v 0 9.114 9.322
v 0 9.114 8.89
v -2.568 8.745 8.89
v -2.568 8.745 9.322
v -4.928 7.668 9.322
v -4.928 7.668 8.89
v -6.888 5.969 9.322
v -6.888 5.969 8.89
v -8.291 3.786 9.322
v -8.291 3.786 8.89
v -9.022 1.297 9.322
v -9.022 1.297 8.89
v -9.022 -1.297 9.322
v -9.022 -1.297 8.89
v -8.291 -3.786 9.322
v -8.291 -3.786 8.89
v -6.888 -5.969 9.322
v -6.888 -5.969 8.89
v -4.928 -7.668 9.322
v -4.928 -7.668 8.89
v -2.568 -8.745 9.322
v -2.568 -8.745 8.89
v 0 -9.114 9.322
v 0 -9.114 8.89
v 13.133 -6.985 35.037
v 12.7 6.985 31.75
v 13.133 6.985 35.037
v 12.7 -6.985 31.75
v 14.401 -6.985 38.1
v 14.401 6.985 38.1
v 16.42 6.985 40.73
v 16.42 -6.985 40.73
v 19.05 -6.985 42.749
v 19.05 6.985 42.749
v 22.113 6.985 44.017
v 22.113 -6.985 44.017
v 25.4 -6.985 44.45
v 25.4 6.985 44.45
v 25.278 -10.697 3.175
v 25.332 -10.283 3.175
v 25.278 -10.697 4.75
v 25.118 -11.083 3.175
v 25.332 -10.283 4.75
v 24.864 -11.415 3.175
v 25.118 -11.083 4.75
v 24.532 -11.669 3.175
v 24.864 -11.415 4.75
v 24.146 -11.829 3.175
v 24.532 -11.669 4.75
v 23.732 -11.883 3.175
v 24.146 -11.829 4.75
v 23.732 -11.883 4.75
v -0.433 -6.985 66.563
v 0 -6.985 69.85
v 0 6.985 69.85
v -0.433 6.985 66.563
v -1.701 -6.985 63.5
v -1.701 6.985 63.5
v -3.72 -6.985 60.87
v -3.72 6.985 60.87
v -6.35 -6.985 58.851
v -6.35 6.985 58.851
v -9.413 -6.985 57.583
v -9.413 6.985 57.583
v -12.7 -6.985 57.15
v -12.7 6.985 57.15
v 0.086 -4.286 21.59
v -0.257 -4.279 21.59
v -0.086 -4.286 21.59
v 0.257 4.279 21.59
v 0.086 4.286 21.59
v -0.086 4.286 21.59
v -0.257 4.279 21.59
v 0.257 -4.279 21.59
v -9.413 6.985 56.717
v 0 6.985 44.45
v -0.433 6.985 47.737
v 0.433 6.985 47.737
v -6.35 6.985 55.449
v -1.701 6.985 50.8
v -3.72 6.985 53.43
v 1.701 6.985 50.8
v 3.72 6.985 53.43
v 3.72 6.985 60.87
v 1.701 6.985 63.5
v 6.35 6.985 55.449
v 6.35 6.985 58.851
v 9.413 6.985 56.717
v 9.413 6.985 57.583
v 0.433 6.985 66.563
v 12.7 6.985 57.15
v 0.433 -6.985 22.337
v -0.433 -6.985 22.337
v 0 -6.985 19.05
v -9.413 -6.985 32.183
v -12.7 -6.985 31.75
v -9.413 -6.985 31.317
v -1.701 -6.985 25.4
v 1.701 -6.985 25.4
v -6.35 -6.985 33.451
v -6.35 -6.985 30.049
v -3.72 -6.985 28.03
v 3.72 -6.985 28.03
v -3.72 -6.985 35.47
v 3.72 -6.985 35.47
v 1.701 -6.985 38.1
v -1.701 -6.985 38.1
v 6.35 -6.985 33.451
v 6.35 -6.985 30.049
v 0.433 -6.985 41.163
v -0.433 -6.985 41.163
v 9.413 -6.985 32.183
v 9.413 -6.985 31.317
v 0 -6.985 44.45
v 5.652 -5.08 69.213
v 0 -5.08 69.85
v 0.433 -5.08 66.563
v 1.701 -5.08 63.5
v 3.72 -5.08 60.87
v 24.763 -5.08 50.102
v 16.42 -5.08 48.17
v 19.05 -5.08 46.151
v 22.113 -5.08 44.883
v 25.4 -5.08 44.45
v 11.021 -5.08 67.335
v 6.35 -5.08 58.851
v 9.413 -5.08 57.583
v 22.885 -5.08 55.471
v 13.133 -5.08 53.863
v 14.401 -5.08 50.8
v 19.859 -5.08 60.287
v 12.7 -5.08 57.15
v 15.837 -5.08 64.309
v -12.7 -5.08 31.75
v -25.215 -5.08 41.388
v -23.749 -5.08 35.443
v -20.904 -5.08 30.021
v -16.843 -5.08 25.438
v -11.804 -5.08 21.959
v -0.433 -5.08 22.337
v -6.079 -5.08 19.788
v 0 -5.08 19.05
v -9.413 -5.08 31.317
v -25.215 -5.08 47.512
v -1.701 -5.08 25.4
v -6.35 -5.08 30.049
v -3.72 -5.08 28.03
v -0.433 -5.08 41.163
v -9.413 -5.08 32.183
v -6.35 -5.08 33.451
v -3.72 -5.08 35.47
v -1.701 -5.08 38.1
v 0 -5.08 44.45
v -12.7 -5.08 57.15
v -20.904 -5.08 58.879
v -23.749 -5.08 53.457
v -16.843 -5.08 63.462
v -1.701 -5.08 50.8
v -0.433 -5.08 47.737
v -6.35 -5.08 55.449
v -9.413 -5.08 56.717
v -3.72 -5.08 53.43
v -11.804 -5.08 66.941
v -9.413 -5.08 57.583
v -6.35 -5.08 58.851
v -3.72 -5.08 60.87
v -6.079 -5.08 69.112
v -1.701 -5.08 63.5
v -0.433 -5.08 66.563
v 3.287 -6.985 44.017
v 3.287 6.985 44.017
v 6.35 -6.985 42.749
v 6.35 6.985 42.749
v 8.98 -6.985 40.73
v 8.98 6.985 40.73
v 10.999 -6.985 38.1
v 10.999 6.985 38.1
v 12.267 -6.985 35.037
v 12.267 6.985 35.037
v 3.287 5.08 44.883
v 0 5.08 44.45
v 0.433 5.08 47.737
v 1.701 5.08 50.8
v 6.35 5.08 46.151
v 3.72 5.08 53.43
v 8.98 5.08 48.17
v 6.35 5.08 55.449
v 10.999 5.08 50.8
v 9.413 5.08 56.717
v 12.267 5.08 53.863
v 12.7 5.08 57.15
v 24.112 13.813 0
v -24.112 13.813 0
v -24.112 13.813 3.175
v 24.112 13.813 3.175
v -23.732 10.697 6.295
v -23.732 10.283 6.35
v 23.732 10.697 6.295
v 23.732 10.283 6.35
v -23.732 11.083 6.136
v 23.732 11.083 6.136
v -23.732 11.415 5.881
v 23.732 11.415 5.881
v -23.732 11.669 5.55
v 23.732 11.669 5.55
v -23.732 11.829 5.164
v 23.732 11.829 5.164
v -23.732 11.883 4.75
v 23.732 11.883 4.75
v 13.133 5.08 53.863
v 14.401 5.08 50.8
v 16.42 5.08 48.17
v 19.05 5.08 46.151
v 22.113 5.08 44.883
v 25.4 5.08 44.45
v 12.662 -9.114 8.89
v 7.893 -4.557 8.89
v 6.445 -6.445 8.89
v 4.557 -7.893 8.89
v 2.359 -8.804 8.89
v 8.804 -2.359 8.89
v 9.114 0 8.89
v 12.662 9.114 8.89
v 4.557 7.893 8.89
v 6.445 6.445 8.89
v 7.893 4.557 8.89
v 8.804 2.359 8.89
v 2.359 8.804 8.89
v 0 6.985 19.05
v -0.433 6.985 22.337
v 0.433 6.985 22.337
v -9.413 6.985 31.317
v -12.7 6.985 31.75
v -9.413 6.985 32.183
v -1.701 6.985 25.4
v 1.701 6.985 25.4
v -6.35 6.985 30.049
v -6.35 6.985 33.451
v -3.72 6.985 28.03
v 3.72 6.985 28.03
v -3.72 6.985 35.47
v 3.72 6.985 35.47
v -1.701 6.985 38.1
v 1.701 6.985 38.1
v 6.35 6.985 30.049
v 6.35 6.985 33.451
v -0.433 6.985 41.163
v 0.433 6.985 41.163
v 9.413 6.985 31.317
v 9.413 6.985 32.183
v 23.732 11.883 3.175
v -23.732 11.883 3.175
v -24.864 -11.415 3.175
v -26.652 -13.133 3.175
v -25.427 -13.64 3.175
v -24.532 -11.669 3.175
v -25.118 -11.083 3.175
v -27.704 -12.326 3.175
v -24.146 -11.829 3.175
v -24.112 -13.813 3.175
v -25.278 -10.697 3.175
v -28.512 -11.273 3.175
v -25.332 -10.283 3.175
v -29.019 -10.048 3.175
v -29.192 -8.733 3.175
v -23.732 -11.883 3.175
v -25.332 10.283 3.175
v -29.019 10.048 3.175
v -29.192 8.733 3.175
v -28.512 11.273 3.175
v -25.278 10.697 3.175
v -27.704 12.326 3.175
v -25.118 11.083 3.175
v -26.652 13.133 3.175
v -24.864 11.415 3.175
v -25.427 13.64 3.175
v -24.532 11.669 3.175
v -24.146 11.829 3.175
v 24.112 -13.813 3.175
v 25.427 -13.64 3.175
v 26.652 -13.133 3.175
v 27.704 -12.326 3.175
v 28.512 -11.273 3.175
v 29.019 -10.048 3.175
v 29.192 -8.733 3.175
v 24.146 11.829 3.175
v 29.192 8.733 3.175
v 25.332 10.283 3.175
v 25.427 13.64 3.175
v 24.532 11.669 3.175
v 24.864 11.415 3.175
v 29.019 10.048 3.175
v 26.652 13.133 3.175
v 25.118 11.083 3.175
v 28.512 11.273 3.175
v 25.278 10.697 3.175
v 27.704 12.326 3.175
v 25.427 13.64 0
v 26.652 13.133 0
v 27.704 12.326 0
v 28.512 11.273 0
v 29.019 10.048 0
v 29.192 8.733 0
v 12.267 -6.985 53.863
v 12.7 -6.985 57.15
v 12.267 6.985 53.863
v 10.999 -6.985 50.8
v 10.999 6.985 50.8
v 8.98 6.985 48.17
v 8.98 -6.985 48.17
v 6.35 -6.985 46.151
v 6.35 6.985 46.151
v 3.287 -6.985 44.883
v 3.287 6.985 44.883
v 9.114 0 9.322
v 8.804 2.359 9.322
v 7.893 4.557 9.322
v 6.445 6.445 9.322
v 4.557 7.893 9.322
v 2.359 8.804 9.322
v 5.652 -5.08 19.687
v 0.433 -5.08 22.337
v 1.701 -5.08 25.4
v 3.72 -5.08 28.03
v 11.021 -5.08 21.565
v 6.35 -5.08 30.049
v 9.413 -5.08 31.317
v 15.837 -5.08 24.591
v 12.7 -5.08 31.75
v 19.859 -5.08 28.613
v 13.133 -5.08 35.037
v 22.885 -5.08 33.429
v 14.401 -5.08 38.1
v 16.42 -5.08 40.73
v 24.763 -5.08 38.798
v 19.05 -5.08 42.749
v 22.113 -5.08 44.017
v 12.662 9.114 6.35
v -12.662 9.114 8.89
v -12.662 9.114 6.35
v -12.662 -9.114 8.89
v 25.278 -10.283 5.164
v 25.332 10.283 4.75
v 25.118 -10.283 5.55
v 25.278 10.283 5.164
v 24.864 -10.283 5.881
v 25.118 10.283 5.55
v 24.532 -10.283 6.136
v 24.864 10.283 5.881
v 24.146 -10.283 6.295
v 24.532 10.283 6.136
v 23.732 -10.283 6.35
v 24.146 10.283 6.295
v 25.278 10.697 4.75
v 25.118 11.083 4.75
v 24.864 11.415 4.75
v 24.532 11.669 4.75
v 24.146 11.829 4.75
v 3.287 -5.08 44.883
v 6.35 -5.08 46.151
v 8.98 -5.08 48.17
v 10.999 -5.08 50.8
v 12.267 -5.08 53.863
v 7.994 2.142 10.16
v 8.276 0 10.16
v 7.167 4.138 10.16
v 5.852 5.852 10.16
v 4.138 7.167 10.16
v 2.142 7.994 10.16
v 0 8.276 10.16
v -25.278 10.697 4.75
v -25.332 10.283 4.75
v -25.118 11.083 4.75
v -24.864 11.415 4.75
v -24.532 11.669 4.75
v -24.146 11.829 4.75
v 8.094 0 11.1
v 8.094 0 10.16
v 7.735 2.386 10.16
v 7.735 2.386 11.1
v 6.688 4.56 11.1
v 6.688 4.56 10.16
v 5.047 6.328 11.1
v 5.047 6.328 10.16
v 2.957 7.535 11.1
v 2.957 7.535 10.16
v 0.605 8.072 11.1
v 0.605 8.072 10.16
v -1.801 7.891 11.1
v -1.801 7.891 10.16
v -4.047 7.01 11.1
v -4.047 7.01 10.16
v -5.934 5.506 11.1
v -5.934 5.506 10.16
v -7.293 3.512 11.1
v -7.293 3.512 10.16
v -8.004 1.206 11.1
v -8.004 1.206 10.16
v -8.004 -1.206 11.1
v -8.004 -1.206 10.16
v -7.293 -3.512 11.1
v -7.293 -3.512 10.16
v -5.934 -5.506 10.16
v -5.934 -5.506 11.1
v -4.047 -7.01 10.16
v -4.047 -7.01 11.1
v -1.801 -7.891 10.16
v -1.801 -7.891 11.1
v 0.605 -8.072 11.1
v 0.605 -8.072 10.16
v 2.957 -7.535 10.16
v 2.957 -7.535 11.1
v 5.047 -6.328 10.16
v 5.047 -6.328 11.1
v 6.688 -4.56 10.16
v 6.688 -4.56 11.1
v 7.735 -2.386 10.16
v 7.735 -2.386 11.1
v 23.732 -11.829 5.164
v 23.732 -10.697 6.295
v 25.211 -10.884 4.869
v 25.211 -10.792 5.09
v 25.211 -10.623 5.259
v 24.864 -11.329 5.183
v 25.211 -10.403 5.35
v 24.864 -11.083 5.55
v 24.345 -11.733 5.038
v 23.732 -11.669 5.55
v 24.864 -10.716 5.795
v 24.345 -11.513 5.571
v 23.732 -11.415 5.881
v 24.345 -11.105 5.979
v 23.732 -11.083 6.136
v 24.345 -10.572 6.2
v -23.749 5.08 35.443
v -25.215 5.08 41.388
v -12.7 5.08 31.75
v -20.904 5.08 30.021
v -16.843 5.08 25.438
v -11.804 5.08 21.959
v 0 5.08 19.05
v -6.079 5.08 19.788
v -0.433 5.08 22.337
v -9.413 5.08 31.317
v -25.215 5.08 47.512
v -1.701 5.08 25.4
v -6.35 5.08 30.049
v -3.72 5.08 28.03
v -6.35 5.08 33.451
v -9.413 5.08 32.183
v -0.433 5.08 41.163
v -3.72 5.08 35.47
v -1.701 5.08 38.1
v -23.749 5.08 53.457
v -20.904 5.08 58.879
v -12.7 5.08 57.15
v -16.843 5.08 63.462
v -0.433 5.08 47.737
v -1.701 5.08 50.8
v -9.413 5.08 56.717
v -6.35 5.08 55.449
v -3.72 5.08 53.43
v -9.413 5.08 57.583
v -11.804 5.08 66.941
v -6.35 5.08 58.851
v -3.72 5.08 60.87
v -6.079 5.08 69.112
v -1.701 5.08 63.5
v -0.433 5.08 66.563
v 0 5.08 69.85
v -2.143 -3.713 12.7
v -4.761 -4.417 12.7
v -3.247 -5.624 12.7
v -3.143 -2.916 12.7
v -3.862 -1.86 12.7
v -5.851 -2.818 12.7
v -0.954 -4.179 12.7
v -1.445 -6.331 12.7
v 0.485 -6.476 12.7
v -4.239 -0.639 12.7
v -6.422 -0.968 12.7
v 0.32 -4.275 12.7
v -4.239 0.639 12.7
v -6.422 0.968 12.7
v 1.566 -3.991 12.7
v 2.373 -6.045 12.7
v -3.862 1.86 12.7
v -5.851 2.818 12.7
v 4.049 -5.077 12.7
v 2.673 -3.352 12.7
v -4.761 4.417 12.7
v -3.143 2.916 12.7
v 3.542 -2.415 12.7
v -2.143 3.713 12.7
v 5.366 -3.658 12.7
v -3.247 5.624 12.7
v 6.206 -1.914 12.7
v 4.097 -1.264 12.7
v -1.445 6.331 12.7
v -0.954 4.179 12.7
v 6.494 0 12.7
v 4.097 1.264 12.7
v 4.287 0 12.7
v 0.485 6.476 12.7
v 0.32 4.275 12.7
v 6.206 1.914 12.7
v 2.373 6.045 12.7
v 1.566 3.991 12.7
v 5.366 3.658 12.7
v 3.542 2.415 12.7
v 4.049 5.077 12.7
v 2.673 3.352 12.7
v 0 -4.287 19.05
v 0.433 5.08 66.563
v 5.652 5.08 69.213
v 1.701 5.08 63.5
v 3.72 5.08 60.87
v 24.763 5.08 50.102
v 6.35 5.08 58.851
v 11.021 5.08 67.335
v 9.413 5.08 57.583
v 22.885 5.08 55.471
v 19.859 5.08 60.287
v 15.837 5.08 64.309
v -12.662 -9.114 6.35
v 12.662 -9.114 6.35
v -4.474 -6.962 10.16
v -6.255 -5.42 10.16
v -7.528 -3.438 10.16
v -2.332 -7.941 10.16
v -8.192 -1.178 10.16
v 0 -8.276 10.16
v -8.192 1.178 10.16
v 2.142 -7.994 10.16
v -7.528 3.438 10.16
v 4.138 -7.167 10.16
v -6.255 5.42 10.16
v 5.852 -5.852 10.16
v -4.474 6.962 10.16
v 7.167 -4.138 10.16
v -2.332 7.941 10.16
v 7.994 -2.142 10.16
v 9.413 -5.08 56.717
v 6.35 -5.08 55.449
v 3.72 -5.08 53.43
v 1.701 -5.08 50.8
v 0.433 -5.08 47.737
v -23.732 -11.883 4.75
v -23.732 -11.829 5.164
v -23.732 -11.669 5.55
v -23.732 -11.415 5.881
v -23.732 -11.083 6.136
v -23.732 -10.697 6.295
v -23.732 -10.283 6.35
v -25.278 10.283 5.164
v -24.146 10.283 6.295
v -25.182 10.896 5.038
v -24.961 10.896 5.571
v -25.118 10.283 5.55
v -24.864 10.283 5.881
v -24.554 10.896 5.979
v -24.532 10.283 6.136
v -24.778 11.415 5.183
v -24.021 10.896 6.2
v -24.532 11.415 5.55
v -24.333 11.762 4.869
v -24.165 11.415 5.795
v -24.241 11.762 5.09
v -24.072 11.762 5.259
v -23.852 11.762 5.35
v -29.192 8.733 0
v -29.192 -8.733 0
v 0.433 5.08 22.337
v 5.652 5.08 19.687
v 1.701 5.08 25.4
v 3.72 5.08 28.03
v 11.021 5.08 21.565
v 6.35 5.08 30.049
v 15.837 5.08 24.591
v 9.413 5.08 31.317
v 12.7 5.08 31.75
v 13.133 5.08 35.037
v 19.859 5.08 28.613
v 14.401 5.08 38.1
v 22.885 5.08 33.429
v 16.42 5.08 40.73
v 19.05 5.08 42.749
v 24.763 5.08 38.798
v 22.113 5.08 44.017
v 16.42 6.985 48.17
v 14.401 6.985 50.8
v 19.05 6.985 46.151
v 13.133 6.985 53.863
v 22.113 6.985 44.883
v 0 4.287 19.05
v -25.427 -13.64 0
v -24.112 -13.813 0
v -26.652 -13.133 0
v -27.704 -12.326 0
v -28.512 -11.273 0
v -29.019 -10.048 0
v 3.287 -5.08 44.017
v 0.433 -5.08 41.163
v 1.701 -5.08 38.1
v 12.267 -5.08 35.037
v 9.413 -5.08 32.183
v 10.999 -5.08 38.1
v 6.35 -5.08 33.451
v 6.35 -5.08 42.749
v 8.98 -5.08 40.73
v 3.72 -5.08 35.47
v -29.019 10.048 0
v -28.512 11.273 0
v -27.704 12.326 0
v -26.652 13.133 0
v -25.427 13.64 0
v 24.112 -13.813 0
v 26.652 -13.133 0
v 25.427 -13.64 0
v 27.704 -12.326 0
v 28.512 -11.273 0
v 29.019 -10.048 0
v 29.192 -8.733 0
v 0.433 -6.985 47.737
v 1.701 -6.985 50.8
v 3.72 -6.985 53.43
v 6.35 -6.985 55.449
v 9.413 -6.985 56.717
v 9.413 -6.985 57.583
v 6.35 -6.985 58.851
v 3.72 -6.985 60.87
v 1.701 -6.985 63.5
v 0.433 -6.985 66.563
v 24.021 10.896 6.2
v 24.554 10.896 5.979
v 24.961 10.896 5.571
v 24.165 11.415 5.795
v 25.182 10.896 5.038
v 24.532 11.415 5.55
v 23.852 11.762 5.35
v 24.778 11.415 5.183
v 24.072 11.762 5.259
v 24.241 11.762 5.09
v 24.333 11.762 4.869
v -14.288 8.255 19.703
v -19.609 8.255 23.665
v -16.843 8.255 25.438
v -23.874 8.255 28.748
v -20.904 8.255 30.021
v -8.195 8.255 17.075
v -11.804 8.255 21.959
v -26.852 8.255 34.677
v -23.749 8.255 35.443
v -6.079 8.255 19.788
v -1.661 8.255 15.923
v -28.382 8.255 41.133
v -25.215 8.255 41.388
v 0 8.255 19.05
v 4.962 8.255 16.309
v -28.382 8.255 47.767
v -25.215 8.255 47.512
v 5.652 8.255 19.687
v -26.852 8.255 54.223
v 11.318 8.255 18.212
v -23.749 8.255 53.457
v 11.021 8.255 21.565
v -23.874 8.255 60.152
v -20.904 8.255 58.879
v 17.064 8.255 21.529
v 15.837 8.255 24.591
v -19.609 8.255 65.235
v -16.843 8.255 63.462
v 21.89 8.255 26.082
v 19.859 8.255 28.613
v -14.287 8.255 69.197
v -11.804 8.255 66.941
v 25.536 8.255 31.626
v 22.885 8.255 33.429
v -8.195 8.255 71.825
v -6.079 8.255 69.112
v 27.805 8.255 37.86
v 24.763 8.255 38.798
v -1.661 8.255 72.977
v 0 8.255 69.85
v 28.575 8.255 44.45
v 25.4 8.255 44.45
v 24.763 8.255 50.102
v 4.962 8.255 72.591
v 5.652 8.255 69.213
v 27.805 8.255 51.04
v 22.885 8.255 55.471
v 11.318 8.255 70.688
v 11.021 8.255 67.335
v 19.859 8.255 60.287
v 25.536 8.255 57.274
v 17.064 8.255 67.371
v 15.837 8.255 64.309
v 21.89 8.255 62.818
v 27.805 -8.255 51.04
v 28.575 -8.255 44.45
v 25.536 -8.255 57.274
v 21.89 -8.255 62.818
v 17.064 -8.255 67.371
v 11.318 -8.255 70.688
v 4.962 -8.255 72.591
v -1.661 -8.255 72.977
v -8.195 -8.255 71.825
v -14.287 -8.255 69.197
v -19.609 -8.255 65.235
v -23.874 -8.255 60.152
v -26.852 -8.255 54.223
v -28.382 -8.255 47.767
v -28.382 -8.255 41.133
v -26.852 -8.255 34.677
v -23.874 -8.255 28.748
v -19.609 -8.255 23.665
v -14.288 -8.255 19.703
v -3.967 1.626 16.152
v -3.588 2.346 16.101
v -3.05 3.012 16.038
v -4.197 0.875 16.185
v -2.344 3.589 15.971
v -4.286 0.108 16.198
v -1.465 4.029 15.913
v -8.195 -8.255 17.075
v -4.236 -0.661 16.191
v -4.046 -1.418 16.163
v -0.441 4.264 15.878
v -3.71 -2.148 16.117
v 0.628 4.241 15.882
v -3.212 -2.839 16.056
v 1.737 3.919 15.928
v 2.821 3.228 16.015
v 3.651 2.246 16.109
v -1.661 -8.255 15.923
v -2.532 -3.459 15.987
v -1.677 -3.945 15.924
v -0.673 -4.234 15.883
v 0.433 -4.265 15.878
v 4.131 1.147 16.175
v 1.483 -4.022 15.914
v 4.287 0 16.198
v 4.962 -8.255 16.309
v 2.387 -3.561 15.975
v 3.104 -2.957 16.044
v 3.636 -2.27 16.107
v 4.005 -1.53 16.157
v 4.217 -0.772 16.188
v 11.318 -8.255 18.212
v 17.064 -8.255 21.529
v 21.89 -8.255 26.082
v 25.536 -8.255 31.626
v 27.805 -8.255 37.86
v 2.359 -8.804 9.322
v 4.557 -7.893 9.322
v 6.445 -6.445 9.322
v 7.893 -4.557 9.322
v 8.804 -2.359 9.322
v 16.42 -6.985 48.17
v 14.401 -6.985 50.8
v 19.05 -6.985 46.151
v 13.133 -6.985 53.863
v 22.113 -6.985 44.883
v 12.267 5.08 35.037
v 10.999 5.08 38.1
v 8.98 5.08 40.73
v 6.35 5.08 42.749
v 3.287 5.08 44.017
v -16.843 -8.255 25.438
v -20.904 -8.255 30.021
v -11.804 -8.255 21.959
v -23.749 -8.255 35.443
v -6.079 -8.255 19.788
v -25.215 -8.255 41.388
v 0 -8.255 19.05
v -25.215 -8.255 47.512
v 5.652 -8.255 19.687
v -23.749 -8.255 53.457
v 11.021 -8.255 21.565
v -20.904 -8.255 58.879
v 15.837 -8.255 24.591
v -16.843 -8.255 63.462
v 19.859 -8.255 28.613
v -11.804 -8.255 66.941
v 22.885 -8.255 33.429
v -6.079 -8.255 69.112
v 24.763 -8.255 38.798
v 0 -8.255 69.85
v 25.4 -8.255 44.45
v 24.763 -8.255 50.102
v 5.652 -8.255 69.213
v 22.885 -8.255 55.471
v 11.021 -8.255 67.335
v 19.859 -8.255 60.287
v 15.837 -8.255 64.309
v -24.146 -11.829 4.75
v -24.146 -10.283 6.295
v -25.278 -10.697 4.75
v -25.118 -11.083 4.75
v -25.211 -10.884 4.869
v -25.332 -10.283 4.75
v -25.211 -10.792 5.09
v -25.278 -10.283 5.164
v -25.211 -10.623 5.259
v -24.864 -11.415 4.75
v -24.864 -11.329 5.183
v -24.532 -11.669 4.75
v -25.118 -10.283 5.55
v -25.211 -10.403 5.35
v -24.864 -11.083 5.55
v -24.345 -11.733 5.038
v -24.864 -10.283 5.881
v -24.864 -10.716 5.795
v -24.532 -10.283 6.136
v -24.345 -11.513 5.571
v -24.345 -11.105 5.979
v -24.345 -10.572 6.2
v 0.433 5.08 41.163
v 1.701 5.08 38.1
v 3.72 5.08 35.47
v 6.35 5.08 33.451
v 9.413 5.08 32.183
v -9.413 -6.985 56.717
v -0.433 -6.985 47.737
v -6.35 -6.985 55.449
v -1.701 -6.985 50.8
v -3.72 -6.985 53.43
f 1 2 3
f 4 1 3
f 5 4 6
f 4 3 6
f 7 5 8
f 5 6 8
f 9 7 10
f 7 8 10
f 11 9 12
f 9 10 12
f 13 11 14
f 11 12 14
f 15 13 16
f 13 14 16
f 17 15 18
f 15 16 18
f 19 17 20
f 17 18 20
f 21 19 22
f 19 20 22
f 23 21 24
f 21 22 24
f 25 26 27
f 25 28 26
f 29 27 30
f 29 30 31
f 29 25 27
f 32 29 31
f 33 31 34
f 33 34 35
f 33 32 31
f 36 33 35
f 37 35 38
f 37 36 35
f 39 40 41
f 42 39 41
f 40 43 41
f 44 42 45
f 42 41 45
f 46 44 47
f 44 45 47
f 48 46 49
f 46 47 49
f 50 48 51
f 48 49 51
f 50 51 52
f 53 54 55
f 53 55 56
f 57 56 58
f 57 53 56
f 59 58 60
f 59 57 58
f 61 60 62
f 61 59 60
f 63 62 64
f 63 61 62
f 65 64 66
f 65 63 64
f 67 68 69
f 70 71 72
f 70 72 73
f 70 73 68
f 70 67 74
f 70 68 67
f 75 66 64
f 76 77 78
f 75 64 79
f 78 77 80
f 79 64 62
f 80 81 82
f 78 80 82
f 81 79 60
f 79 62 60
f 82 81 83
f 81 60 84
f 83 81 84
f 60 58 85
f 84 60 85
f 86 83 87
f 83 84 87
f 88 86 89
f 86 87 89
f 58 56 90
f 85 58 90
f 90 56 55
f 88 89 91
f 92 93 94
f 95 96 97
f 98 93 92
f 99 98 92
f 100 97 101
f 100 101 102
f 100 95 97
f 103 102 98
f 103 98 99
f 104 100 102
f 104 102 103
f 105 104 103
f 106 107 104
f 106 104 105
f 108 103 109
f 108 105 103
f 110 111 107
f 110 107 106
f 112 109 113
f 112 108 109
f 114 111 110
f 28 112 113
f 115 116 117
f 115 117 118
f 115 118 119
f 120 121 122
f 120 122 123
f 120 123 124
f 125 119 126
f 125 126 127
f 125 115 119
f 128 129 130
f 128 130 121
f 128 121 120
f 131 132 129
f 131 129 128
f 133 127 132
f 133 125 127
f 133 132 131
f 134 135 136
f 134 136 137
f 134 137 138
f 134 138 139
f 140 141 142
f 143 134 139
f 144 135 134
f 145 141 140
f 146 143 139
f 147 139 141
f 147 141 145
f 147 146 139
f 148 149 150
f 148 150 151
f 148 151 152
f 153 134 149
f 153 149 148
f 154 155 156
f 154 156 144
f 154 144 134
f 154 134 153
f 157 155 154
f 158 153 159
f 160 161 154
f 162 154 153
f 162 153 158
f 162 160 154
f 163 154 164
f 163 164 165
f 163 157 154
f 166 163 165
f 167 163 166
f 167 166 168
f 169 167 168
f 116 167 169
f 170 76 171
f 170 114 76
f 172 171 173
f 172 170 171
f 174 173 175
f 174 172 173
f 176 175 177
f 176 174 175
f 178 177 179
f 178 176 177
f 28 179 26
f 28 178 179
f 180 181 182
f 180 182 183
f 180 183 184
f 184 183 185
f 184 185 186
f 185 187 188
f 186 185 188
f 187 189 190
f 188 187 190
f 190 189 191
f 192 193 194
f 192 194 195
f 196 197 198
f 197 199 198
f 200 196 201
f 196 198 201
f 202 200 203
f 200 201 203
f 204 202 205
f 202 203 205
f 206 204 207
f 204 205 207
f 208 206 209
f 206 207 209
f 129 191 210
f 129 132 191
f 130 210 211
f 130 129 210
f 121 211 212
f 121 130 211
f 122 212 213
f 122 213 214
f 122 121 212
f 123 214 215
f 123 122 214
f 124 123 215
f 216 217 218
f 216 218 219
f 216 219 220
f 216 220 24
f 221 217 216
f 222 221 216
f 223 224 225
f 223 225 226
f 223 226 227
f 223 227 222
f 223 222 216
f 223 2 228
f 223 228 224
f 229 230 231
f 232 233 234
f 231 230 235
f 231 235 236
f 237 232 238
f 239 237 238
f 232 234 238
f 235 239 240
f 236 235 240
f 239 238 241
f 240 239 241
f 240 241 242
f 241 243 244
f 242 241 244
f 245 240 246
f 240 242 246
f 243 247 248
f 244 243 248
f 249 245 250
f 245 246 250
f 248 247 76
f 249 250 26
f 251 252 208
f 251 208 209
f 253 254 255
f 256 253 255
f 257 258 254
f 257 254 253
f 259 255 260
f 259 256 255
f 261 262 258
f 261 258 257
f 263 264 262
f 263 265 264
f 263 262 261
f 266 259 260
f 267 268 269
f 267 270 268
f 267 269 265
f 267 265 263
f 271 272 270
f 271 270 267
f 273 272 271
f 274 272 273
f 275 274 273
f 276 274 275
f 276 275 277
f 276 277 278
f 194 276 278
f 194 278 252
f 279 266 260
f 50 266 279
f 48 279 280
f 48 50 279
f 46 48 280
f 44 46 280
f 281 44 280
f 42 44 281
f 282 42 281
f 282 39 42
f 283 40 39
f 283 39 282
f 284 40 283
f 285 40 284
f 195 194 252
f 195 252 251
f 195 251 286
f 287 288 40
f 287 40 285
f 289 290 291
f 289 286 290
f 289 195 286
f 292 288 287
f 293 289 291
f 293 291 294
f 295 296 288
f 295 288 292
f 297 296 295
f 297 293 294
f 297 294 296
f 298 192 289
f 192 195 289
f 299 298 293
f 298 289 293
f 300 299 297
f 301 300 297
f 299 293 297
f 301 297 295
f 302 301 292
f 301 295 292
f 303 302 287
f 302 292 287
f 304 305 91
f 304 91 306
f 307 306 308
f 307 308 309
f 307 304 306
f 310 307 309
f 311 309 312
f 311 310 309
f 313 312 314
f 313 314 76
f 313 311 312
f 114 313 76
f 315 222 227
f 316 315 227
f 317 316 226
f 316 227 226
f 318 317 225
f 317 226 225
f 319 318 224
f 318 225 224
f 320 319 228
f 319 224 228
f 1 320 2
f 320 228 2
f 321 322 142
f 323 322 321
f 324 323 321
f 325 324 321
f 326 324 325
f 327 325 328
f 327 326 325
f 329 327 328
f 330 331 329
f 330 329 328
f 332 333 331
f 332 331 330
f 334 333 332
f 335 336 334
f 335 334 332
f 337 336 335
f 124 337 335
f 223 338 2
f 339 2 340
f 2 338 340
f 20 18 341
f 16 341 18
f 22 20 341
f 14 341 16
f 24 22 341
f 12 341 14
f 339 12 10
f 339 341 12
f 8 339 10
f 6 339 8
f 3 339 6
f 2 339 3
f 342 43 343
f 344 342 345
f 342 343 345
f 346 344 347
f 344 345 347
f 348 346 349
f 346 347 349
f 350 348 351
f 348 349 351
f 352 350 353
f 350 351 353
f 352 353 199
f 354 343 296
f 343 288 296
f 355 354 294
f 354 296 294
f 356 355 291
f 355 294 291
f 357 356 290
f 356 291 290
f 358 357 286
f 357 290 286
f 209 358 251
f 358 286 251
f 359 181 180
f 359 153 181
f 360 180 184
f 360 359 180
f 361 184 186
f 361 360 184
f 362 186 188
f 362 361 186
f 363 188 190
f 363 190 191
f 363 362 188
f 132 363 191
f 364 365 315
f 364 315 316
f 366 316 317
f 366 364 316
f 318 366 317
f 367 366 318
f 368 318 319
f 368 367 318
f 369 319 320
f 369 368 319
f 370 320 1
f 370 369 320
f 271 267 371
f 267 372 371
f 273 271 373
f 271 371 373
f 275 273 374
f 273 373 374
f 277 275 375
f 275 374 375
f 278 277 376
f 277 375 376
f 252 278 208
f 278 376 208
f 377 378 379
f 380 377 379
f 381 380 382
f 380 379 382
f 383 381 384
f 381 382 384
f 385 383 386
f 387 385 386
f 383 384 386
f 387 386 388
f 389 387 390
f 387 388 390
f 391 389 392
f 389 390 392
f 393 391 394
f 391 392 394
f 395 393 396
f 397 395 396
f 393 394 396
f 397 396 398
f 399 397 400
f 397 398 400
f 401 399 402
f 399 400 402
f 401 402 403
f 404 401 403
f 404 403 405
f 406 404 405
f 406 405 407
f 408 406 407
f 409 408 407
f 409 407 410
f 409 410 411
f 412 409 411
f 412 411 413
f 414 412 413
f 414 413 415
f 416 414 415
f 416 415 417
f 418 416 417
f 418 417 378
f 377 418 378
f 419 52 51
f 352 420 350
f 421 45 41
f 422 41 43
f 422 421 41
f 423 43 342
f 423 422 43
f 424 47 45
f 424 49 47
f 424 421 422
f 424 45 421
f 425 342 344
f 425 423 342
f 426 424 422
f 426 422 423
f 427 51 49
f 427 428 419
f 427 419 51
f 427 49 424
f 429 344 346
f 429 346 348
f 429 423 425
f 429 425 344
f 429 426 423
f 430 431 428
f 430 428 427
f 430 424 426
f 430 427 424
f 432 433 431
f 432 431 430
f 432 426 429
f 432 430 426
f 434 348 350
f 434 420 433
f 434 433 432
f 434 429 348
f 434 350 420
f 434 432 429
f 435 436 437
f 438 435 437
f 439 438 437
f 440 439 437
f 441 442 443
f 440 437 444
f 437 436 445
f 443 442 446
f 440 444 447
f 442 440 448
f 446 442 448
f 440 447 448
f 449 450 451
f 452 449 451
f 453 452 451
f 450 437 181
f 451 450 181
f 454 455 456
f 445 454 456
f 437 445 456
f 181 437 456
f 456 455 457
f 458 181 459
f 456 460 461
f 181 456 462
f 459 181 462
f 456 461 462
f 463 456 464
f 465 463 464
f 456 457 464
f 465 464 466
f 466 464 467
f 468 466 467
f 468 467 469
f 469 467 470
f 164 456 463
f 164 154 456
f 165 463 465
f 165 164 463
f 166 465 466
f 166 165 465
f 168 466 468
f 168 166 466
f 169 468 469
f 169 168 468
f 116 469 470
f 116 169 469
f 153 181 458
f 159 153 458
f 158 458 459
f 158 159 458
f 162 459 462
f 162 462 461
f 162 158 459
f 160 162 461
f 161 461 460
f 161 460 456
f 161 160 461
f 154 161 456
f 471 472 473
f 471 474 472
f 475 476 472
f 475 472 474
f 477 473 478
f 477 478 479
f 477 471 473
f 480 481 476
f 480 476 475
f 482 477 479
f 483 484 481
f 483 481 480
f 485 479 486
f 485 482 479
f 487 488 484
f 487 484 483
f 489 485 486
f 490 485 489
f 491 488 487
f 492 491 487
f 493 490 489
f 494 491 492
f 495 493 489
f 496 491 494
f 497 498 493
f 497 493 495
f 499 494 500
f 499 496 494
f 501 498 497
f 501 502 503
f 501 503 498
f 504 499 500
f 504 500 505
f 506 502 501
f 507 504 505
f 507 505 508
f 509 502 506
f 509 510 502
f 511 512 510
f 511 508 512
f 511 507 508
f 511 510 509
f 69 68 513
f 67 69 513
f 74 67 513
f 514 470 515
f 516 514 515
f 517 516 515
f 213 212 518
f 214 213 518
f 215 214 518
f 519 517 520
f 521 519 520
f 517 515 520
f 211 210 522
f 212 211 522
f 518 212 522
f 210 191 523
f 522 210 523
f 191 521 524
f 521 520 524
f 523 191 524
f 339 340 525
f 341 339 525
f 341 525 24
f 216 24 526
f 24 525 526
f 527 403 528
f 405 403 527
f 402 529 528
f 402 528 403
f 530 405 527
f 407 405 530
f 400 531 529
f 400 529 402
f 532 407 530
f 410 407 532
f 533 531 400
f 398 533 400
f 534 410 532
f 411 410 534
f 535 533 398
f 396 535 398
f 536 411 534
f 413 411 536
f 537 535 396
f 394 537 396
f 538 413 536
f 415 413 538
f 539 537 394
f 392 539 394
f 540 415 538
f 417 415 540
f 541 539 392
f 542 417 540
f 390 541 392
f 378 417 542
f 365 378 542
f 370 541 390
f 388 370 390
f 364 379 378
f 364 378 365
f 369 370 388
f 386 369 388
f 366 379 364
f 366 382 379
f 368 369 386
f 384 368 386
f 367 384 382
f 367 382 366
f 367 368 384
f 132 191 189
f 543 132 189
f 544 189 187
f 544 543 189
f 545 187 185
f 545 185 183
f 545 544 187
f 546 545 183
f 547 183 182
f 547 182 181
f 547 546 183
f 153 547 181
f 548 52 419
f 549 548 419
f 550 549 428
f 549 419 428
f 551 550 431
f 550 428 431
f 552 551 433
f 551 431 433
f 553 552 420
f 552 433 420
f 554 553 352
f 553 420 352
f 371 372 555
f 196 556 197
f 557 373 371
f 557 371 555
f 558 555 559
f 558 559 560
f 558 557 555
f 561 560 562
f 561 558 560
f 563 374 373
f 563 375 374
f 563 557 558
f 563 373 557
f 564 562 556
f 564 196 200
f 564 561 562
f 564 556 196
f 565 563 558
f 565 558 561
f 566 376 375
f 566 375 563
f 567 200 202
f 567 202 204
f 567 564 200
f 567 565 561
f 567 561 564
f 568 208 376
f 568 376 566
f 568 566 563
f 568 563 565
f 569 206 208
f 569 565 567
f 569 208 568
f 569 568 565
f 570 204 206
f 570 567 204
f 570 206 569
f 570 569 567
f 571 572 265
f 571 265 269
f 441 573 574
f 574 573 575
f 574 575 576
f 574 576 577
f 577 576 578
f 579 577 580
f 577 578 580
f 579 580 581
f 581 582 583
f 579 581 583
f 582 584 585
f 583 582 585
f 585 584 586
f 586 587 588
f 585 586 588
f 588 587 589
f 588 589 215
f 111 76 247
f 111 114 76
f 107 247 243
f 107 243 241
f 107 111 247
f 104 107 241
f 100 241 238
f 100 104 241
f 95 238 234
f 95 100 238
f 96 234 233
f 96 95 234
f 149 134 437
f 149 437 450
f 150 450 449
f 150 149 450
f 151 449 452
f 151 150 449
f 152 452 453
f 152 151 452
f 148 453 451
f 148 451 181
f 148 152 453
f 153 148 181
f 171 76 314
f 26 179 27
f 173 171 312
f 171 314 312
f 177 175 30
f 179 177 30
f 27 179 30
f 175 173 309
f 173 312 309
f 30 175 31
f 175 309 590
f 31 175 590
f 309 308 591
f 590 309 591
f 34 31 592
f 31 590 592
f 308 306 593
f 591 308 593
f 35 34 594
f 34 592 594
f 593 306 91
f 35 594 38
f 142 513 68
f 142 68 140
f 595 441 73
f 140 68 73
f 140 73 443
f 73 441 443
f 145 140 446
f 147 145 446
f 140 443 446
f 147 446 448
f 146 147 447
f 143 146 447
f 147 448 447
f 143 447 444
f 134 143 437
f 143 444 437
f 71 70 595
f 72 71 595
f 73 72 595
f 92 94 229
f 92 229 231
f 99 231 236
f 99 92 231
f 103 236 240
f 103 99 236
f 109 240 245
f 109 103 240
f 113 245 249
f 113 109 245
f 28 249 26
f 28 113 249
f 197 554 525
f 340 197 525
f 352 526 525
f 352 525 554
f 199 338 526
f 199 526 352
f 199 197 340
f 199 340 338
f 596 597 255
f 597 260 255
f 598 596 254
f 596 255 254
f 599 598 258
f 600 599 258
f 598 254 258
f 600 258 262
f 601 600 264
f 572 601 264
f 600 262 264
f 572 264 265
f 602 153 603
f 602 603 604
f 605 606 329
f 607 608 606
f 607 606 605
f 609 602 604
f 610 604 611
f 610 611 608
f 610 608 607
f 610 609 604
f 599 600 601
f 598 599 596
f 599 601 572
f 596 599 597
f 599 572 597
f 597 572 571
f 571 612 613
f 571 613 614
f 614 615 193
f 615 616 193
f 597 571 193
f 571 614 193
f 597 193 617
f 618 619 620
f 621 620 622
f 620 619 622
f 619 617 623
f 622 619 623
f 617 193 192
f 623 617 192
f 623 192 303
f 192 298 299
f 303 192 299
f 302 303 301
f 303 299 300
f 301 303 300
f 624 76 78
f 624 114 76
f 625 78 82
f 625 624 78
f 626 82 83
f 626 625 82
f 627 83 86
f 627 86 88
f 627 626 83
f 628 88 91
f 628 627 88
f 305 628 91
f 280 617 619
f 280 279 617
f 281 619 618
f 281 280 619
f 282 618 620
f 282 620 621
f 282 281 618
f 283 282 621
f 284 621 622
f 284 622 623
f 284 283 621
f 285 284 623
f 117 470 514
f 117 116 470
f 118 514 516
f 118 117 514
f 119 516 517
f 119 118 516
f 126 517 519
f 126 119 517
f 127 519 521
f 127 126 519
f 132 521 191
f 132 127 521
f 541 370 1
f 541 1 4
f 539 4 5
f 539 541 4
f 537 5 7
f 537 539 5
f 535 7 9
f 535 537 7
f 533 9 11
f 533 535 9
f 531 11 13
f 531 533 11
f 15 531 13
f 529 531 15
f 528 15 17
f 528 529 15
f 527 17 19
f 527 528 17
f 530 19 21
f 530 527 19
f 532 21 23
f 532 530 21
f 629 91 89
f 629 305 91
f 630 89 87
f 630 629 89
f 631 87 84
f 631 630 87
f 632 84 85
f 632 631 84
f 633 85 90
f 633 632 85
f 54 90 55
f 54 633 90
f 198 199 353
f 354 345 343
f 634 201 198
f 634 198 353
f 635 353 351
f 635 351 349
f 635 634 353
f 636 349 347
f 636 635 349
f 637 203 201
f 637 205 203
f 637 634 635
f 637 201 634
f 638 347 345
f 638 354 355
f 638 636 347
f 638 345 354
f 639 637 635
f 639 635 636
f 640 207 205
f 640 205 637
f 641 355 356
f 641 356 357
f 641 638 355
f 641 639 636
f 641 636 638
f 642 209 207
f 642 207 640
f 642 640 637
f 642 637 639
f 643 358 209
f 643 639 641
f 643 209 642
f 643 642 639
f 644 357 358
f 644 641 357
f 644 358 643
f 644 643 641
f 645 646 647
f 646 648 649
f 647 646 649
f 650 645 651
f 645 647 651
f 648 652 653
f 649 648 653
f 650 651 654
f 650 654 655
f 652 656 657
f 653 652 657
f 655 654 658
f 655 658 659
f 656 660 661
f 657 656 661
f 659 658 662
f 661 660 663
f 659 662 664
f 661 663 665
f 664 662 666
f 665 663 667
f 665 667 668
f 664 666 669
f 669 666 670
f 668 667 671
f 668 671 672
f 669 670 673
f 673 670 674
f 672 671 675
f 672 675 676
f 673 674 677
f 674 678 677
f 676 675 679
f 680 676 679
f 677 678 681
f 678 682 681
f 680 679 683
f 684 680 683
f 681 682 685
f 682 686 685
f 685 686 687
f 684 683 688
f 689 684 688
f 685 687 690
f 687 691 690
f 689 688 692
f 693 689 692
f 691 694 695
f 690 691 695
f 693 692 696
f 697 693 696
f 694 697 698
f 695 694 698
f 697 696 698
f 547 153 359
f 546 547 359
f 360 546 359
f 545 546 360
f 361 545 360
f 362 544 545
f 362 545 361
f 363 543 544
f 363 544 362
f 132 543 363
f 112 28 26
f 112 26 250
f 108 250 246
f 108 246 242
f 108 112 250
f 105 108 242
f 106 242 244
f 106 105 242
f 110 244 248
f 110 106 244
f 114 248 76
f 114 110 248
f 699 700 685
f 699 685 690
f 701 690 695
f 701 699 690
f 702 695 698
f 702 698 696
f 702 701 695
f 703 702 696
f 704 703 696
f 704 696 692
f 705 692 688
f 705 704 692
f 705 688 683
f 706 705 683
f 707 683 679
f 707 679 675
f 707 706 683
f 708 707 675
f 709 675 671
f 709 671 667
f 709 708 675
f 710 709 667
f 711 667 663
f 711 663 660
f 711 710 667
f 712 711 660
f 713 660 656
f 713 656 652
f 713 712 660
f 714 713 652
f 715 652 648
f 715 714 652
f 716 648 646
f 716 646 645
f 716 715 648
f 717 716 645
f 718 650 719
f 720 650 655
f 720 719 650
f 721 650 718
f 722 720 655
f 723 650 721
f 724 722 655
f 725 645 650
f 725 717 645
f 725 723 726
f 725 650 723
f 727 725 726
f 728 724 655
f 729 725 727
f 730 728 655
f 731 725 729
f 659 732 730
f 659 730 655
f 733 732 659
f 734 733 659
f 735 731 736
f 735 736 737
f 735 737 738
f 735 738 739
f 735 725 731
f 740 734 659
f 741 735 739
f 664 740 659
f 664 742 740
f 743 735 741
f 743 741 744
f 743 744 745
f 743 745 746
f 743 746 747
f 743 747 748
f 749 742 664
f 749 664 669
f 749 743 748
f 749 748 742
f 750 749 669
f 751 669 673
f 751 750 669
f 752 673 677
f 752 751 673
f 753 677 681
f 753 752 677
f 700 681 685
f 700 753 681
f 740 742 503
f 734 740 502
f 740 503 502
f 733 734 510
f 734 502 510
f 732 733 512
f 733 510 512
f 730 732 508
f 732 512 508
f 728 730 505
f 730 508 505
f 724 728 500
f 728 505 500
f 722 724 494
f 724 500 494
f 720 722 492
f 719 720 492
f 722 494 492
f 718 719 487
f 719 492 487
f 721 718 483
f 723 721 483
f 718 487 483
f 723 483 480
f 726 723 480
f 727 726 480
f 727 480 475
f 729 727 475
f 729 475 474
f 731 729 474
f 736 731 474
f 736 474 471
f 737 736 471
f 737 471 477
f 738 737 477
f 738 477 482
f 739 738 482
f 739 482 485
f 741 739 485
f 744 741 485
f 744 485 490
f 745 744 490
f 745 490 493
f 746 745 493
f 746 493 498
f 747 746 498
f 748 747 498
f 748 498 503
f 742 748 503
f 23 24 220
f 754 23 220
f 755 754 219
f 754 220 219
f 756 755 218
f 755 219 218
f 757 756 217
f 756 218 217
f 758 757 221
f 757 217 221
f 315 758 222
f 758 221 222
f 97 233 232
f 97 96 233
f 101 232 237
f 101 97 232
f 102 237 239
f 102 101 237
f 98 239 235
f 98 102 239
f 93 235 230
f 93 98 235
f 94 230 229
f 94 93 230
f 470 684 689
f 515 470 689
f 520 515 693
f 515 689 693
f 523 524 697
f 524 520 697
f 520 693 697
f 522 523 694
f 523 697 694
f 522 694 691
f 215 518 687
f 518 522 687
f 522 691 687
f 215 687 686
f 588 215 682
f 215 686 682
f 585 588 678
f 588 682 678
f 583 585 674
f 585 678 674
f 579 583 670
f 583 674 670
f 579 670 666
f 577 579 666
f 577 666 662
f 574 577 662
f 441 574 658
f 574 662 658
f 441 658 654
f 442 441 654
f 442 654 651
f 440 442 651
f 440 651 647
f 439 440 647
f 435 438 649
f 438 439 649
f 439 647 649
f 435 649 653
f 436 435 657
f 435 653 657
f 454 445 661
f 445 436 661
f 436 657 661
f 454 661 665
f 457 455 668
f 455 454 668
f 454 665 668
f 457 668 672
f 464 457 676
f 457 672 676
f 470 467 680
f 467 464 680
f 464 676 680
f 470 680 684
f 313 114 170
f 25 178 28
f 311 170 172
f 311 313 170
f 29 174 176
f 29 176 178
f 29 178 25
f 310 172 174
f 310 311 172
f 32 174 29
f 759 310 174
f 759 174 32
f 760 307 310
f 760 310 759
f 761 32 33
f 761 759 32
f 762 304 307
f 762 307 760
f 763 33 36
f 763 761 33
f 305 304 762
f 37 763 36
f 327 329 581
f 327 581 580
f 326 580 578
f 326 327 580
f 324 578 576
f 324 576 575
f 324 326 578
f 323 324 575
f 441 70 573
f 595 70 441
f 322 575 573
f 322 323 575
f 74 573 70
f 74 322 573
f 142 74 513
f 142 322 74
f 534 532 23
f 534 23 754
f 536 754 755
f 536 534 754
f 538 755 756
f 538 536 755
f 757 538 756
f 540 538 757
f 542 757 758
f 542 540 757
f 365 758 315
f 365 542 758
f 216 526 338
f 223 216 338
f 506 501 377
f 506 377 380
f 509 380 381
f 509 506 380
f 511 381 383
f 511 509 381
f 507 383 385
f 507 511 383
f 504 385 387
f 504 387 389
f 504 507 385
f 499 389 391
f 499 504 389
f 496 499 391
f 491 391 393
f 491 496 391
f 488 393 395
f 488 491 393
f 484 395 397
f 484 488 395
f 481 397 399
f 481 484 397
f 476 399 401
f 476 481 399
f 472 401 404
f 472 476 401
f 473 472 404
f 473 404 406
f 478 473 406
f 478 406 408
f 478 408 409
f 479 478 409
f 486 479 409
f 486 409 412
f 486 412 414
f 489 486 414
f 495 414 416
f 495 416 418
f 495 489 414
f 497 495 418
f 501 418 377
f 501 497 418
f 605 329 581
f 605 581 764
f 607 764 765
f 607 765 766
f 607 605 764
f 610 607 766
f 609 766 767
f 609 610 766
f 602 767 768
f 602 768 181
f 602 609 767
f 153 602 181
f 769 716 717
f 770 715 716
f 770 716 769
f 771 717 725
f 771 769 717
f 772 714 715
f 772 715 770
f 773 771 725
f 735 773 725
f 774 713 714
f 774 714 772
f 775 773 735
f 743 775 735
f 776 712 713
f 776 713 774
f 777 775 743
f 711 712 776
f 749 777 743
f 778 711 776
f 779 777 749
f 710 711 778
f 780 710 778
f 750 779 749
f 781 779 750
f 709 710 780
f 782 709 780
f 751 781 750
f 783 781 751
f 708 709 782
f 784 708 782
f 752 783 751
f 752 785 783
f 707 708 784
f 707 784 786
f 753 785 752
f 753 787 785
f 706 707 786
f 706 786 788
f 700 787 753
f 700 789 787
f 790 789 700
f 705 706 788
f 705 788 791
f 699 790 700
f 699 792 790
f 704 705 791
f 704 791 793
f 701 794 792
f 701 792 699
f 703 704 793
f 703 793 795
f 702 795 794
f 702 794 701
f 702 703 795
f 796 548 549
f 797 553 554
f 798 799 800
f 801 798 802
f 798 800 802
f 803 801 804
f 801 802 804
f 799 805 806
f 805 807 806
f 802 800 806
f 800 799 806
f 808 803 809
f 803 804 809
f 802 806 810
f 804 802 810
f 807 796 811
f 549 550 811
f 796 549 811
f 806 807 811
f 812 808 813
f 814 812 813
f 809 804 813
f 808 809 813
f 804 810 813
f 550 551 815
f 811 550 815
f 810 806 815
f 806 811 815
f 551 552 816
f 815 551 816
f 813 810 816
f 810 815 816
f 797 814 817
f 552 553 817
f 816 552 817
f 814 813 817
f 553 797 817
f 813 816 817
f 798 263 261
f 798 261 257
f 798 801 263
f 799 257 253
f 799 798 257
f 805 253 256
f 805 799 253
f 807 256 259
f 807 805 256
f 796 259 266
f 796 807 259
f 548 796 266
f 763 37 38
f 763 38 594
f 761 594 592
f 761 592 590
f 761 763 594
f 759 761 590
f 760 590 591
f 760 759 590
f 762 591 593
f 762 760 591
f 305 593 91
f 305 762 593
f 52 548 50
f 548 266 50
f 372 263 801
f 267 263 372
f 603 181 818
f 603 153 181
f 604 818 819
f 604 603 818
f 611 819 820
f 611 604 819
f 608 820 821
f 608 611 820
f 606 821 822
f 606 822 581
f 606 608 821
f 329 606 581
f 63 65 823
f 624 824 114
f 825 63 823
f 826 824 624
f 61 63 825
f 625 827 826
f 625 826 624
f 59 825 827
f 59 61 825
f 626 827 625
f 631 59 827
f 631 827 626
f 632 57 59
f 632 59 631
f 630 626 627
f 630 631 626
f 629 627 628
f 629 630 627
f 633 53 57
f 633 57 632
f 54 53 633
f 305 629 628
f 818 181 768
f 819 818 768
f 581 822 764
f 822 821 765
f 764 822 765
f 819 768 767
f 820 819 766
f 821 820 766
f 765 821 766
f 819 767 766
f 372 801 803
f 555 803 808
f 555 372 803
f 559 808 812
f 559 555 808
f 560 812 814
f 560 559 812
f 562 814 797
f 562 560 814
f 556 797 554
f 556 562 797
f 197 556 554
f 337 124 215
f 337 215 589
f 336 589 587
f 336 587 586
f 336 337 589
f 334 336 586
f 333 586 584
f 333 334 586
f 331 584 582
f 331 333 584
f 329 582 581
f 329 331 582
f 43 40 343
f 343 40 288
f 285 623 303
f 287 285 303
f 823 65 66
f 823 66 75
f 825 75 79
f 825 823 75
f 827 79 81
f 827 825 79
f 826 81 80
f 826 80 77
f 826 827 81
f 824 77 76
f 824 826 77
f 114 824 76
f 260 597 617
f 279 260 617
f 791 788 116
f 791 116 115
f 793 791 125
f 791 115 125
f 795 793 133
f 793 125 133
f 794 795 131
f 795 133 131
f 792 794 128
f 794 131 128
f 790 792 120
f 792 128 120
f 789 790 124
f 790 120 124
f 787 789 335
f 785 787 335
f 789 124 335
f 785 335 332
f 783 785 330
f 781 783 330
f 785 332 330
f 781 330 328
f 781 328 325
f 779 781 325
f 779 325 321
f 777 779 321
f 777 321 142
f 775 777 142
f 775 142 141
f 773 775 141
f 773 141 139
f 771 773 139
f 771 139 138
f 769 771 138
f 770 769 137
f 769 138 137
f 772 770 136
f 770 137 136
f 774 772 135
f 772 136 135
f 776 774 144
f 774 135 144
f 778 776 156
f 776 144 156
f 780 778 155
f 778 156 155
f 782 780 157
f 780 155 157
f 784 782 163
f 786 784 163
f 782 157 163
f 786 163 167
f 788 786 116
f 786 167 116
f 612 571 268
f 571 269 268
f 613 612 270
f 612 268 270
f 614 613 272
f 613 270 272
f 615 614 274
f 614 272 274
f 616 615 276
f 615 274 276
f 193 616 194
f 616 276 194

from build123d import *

# Parameters (mm, degrees)
F1_R      = 4.2869666311
F2_DEPTH  = 21.59
F1_R_2    = 8.0943888298
F3_DEPTH  = 12.7
F4_DEPTH  = 10.16
F5_DEPTH  = 8.89
F1_W      = 50.6647676229
F1_H      = 23.7669274211
F6_DEPTH  = 6.35
F1_W_2    = 58.3845302463
F1_H_2    = 27.6268087327
F7_DEPTH  = 3.175
F8_R      = 1.6002
F9_R      = 1.6002
F10_R     = 1.6002
F11_R     = 1.6002
F12_SIZE  = 0.8382
F13_SIZE  = 1.6002
F14_R     = 5.08
F15_R     = 5.08
F16_R     = 5.08
F17_R     = 5.08
F0_R      = 28.575
F18_DEPTH = 8.255
F19_DEPTH = 5.08
F20_DEPTH = 6.985


with BuildPart() as f2:
    # F1 (on Top) → F2 (new body)
    with BuildSketch(Plane.XY):
        Circle(F1_R)
    extrude(amount=F2_DEPTH)

    # F1 (on Top) → F3 (join)
    with BuildSketch(Plane.XY):
        Circle(F1_R_2)
        Circle(F1_R, mode=Mode.SUBTRACT)
    extrude(amount=F3_DEPTH)

    # F1 (on Top) → F4 (join)
    with BuildSketch(Plane.XY):
        with BuildLine():
            ThreePointArc((0, 9.1144200414), (-9.1144200414, -7.9e-09), (1.57e-08, -9.1144200414))
            ThreePointArc((1.57e-08, -9.1144200414), (6.4448682235, -6.4448682123), (9.1144200414, 0))
            ThreePointArc((9.1144200414, 0), (6.4448682179, 6.4448682179), (0, 9.1144200414))
        make_face()
        Circle(F1_R_2, mode=Mode.SUBTRACT)
    extrude(amount=F4_DEPTH)

    # F1 (on Top) → F5 (join)
    with BuildSketch(Plane.XY):
        with BuildLine():
            Line((-12.6619096845, -9.1144200414), (1.57e-08, -9.1144200414))
            ThreePointArc((1.57e-08, -9.1144200414), (-9.1144200414, -7.9e-09), (0, 9.1144200414))
            Line((0, 9.1144200414), (-12.6619096845, 9.1144200414))
            Line((-12.6619096845, 9.1144200414), (-12.6619096845, -9.1144200414))
        make_face()
        with BuildLine():
            Line((1.57e-08, -9.1144200414), (12.6619096845, -9.1144200414))
            Line((12.6619096845, -9.1144200414), (12.6619096845, 9.1144200414))
            Line((12.6619096845, 9.1144200414), (0, 9.1144200414))
            ThreePointArc((0, 9.1144200414), (6.4448682179, 6.4448682179), (9.1144200414, 0))
            ThreePointArc((9.1144200414, 0), (6.4448682235, -6.4448682123), (1.57e-08, -9.1144200414))
        make_face()
    extrude(amount=F5_DEPTH)

    # F1 (on Top) → F6 (join)
    with BuildSketch(Plane.XY):
        Rectangle(F1_W, F1_H)
        Polygon((12.6619096845, 9.1144200414), (12.6619096845, -9.1144200414), (1.57e-08, -9.1144200414), (-12.6619096845, -9.1144200414), (-12.6619096845, 9.1144200414), (0, 9.1144200414), align=None, mode=Mode.SUBTRACT)
    extrude(amount=F6_DEPTH)

    # F1 (on Top) → F7 (join)
    with BuildSketch(Plane.XY):
        Rectangle(F1_W_2, F1_H_2)
        Rectangle(F1_W, F1_H, mode=Mode.SUBTRACT)
    extrude(amount=F7_DEPTH)

    # F8
    f8_edges = [f2.edges().sort_by_distance(p)[0] for p in [
        (0, -11.883464, 6.35),
    ]]
    fillet(f8_edges, radius=F8_R)

    # F9
    f9_edges = [f2.edges().sort_by_distance(p)[0] for p in [
        (-25.332384, 0.8001, 6.35),
    ]]
    fillet(f9_edges, radius=F9_R)

    # F10
    f10_edges = [f2.edges().sort_by_distance(p)[0] for p in [
        (25.332384, 0.8001, 6.35),
    ]]
    fillet(f10_edges, radius=F10_R)

    # F11
    f11_edges = [f2.edges().sort_by_distance(p)[0] for p in [
        (0, 11.883464, 6.35),
    ]]
    fillet(f11_edges, radius=F11_R)

    # F12
    f12_edges = [f2.edges().sort_by_distance(p)[0] for p in [
        (0, 9.11442, 10.16),
    ]]
    chamfer(f12_edges, length=F12_SIZE)

    # F13
    f13_edges = [f2.edges().sort_by_distance(p)[0] for p in [
        (-8.094389, 0, 12.7),
    ]]
    chamfer(f13_edges, length=F13_SIZE)

    # F14
    f14_edges = [f2.edges().sort_by_distance(p)[0] for p in [
        (29.192265, -13.813404, 1.5875),
    ]]
    fillet(f14_edges, radius=F14_R)

    # F15
    f15_edges = [f2.edges().sort_by_distance(p)[0] for p in [
        (-29.192265, -13.813404, 1.5875),
    ]]
    fillet(f15_edges, radius=F15_R)

    # F16
    f16_edges = [f2.edges().sort_by_distance(p)[0] for p in [
        (-29.192265, 13.813404, 1.5875),
    ]]
    fillet(f16_edges, radius=F16_R)

    # F17
    f17_edges = [f2.edges().sort_by_distance(p)[0] for p in [
        (29.192265, 13.813404, 1.5875),
    ]]
    fillet(f17_edges, radius=F17_R)

    # F0 (on Front) → F18 (join, symmetric)
    with BuildSketch(Plane.XZ):
        with Locations((0, 44.45)):
            Circle(F0_R)
        with BuildLine():
            ThreePointArc((0, 69.85), (17.9605122421, 62.4105122421), (25.4, 44.45))
            ThreePointArc((25.4, 44.45), (17.9605122421, 26.4894877579), (0, 19.05))
            ThreePointArc((0, 19.05), (-25.4, 44.45), (0, 69.85))
        make_face(mode=Mode.SUBTRACT)
    extrude(amount=F18_DEPTH, both=True)



with BuildPart() as f19:
    # F0 (on Front) → F19 (new body, symmetric)
    with BuildSketch(Plane.XZ):
        with BuildLine():
            ThreePointArc((0, 44.45), (8.9802561211, 48.1697438789), (12.7, 57.15))
            ThreePointArc((12.7, 57.15), (3.7197438789, 53.4302561211), (0, 44.45))
        make_face()
    extrude(amount=F19_DEPTH, both=True)

    # F0 (on Front) → F19, piece 2 (join, symmetric)
    with BuildSketch(Plane.XZ):
        with BuildLine():
            ThreePointArc((0, 44.45), (3.7197438789, 35.4697438789), (12.7, 31.75))
            ThreePointArc((12.7, 31.75), (8.9802561211, 40.7302561211), (0, 44.45))
        make_face()
    extrude(amount=F19_DEPTH, both=True)


with BuildPart() as f2_1:
    add(f2.part)

    add(f19.part)  # F19#3 merges F19
    # F0 (on Front) → F19, piece 3 (join, symmetric)
    with BuildSketch(Plane.XZ):
        with BuildLine():
            ThreePointArc((-12.7, 57.15), (-3.7197438789, 60.8697438789), (0, 69.85))
            ThreePointArc((0, 69.85), (-25.4, 44.45), (0, 19.05))
            ThreePointArc((0, 19.05), (-3.7197438789, 28.0302561211), (-12.7, 31.75))
            ThreePointArc((-12.7, 31.75), (-3.7197438789, 35.4697438789), (0, 44.45))
            ThreePointArc((0, 44.45), (-3.7197438789, 53.4302561211), (-12.7, 57.15))
        make_face()
        with BuildLine():
            ThreePointArc((0, 19.05), (17.9605122421, 26.4894877579), (25.4, 44.45))
            ThreePointArc((25.4, 44.45), (16.4197438789, 40.7302561211), (12.7, 31.75))
            ThreePointArc((12.7, 31.75), (3.7197438789, 28.0302561211), (0, 19.05))
        make_face()
        with BuildLine():
            ThreePointArc((12.7, 57.15), (16.4197438789, 48.1697438789), (25.4, 44.45))
            ThreePointArc((25.4, 44.45), (17.9605122421, 62.4105122421), (0, 69.85))
            ThreePointArc((0, 69.85), (3.7197438789, 60.8697438789), (12.7, 57.15))
        make_face()
    extrude(amount=F19_DEPTH, both=True)


with BuildPart() as f20:
    # F0 (on Front) → F20 (new body, symmetric)
    with BuildSketch(Plane.XZ):
        with BuildLine():
            ThreePointArc((12.7, 57.15), (3.7197438789, 60.8697438789), (0, 69.85))
            ThreePointArc((0, 69.85), (-3.7197438789, 60.8697438789), (-12.7, 57.15))
            ThreePointArc((-12.7, 57.15), (-3.7197438789, 53.4302561211), (0, 44.45))
            ThreePointArc((0, 44.45), (3.7197438789, 53.4302561211), (12.7, 57.15))
        make_face()
    extrude(amount=F20_DEPTH, both=True)


with BuildPart() as f20b:
    # F0 (on Front) → F20, piece 2 (new body, symmetric)
    with BuildSketch(Plane.XZ):
        with BuildLine():
            ThreePointArc((12.7, 31.75), (16.4197438789, 40.7302561211), (25.4, 44.45))
            ThreePointArc((25.4, 44.45), (16.4197438789, 48.1697438789), (12.7, 57.15))
            ThreePointArc((12.7, 57.15), (8.9802561211, 48.1697438789), (0, 44.45))
            ThreePointArc((0, 44.45), (8.9802561211, 40.7302561211), (12.7, 31.75))
        make_face()
    extrude(amount=F20_DEPTH, both=True)


with BuildPart() as f20c:
    # F0 (on Front) → F20, piece 3 (new body, symmetric)
    with BuildSketch(Plane.XZ):
        with BuildLine():
            ThreePointArc((-12.7, 31.75), (-3.7197438789, 28.0302561211), (0, 19.05))
            ThreePointArc((0, 19.05), (3.7197438789, 28.0302561211), (12.7, 31.75))
            ThreePointArc((12.7, 31.75), (3.7197438789, 35.4697438789), (0, 44.45))
            ThreePointArc((0, 44.45), (-3.7197438789, 35.4697438789), (-12.7, 31.75))
        make_face()
    extrude(amount=F20_DEPTH, both=True)


solid = Compound([f2_1.part, f20.part, f20b.part, f20c.part])
